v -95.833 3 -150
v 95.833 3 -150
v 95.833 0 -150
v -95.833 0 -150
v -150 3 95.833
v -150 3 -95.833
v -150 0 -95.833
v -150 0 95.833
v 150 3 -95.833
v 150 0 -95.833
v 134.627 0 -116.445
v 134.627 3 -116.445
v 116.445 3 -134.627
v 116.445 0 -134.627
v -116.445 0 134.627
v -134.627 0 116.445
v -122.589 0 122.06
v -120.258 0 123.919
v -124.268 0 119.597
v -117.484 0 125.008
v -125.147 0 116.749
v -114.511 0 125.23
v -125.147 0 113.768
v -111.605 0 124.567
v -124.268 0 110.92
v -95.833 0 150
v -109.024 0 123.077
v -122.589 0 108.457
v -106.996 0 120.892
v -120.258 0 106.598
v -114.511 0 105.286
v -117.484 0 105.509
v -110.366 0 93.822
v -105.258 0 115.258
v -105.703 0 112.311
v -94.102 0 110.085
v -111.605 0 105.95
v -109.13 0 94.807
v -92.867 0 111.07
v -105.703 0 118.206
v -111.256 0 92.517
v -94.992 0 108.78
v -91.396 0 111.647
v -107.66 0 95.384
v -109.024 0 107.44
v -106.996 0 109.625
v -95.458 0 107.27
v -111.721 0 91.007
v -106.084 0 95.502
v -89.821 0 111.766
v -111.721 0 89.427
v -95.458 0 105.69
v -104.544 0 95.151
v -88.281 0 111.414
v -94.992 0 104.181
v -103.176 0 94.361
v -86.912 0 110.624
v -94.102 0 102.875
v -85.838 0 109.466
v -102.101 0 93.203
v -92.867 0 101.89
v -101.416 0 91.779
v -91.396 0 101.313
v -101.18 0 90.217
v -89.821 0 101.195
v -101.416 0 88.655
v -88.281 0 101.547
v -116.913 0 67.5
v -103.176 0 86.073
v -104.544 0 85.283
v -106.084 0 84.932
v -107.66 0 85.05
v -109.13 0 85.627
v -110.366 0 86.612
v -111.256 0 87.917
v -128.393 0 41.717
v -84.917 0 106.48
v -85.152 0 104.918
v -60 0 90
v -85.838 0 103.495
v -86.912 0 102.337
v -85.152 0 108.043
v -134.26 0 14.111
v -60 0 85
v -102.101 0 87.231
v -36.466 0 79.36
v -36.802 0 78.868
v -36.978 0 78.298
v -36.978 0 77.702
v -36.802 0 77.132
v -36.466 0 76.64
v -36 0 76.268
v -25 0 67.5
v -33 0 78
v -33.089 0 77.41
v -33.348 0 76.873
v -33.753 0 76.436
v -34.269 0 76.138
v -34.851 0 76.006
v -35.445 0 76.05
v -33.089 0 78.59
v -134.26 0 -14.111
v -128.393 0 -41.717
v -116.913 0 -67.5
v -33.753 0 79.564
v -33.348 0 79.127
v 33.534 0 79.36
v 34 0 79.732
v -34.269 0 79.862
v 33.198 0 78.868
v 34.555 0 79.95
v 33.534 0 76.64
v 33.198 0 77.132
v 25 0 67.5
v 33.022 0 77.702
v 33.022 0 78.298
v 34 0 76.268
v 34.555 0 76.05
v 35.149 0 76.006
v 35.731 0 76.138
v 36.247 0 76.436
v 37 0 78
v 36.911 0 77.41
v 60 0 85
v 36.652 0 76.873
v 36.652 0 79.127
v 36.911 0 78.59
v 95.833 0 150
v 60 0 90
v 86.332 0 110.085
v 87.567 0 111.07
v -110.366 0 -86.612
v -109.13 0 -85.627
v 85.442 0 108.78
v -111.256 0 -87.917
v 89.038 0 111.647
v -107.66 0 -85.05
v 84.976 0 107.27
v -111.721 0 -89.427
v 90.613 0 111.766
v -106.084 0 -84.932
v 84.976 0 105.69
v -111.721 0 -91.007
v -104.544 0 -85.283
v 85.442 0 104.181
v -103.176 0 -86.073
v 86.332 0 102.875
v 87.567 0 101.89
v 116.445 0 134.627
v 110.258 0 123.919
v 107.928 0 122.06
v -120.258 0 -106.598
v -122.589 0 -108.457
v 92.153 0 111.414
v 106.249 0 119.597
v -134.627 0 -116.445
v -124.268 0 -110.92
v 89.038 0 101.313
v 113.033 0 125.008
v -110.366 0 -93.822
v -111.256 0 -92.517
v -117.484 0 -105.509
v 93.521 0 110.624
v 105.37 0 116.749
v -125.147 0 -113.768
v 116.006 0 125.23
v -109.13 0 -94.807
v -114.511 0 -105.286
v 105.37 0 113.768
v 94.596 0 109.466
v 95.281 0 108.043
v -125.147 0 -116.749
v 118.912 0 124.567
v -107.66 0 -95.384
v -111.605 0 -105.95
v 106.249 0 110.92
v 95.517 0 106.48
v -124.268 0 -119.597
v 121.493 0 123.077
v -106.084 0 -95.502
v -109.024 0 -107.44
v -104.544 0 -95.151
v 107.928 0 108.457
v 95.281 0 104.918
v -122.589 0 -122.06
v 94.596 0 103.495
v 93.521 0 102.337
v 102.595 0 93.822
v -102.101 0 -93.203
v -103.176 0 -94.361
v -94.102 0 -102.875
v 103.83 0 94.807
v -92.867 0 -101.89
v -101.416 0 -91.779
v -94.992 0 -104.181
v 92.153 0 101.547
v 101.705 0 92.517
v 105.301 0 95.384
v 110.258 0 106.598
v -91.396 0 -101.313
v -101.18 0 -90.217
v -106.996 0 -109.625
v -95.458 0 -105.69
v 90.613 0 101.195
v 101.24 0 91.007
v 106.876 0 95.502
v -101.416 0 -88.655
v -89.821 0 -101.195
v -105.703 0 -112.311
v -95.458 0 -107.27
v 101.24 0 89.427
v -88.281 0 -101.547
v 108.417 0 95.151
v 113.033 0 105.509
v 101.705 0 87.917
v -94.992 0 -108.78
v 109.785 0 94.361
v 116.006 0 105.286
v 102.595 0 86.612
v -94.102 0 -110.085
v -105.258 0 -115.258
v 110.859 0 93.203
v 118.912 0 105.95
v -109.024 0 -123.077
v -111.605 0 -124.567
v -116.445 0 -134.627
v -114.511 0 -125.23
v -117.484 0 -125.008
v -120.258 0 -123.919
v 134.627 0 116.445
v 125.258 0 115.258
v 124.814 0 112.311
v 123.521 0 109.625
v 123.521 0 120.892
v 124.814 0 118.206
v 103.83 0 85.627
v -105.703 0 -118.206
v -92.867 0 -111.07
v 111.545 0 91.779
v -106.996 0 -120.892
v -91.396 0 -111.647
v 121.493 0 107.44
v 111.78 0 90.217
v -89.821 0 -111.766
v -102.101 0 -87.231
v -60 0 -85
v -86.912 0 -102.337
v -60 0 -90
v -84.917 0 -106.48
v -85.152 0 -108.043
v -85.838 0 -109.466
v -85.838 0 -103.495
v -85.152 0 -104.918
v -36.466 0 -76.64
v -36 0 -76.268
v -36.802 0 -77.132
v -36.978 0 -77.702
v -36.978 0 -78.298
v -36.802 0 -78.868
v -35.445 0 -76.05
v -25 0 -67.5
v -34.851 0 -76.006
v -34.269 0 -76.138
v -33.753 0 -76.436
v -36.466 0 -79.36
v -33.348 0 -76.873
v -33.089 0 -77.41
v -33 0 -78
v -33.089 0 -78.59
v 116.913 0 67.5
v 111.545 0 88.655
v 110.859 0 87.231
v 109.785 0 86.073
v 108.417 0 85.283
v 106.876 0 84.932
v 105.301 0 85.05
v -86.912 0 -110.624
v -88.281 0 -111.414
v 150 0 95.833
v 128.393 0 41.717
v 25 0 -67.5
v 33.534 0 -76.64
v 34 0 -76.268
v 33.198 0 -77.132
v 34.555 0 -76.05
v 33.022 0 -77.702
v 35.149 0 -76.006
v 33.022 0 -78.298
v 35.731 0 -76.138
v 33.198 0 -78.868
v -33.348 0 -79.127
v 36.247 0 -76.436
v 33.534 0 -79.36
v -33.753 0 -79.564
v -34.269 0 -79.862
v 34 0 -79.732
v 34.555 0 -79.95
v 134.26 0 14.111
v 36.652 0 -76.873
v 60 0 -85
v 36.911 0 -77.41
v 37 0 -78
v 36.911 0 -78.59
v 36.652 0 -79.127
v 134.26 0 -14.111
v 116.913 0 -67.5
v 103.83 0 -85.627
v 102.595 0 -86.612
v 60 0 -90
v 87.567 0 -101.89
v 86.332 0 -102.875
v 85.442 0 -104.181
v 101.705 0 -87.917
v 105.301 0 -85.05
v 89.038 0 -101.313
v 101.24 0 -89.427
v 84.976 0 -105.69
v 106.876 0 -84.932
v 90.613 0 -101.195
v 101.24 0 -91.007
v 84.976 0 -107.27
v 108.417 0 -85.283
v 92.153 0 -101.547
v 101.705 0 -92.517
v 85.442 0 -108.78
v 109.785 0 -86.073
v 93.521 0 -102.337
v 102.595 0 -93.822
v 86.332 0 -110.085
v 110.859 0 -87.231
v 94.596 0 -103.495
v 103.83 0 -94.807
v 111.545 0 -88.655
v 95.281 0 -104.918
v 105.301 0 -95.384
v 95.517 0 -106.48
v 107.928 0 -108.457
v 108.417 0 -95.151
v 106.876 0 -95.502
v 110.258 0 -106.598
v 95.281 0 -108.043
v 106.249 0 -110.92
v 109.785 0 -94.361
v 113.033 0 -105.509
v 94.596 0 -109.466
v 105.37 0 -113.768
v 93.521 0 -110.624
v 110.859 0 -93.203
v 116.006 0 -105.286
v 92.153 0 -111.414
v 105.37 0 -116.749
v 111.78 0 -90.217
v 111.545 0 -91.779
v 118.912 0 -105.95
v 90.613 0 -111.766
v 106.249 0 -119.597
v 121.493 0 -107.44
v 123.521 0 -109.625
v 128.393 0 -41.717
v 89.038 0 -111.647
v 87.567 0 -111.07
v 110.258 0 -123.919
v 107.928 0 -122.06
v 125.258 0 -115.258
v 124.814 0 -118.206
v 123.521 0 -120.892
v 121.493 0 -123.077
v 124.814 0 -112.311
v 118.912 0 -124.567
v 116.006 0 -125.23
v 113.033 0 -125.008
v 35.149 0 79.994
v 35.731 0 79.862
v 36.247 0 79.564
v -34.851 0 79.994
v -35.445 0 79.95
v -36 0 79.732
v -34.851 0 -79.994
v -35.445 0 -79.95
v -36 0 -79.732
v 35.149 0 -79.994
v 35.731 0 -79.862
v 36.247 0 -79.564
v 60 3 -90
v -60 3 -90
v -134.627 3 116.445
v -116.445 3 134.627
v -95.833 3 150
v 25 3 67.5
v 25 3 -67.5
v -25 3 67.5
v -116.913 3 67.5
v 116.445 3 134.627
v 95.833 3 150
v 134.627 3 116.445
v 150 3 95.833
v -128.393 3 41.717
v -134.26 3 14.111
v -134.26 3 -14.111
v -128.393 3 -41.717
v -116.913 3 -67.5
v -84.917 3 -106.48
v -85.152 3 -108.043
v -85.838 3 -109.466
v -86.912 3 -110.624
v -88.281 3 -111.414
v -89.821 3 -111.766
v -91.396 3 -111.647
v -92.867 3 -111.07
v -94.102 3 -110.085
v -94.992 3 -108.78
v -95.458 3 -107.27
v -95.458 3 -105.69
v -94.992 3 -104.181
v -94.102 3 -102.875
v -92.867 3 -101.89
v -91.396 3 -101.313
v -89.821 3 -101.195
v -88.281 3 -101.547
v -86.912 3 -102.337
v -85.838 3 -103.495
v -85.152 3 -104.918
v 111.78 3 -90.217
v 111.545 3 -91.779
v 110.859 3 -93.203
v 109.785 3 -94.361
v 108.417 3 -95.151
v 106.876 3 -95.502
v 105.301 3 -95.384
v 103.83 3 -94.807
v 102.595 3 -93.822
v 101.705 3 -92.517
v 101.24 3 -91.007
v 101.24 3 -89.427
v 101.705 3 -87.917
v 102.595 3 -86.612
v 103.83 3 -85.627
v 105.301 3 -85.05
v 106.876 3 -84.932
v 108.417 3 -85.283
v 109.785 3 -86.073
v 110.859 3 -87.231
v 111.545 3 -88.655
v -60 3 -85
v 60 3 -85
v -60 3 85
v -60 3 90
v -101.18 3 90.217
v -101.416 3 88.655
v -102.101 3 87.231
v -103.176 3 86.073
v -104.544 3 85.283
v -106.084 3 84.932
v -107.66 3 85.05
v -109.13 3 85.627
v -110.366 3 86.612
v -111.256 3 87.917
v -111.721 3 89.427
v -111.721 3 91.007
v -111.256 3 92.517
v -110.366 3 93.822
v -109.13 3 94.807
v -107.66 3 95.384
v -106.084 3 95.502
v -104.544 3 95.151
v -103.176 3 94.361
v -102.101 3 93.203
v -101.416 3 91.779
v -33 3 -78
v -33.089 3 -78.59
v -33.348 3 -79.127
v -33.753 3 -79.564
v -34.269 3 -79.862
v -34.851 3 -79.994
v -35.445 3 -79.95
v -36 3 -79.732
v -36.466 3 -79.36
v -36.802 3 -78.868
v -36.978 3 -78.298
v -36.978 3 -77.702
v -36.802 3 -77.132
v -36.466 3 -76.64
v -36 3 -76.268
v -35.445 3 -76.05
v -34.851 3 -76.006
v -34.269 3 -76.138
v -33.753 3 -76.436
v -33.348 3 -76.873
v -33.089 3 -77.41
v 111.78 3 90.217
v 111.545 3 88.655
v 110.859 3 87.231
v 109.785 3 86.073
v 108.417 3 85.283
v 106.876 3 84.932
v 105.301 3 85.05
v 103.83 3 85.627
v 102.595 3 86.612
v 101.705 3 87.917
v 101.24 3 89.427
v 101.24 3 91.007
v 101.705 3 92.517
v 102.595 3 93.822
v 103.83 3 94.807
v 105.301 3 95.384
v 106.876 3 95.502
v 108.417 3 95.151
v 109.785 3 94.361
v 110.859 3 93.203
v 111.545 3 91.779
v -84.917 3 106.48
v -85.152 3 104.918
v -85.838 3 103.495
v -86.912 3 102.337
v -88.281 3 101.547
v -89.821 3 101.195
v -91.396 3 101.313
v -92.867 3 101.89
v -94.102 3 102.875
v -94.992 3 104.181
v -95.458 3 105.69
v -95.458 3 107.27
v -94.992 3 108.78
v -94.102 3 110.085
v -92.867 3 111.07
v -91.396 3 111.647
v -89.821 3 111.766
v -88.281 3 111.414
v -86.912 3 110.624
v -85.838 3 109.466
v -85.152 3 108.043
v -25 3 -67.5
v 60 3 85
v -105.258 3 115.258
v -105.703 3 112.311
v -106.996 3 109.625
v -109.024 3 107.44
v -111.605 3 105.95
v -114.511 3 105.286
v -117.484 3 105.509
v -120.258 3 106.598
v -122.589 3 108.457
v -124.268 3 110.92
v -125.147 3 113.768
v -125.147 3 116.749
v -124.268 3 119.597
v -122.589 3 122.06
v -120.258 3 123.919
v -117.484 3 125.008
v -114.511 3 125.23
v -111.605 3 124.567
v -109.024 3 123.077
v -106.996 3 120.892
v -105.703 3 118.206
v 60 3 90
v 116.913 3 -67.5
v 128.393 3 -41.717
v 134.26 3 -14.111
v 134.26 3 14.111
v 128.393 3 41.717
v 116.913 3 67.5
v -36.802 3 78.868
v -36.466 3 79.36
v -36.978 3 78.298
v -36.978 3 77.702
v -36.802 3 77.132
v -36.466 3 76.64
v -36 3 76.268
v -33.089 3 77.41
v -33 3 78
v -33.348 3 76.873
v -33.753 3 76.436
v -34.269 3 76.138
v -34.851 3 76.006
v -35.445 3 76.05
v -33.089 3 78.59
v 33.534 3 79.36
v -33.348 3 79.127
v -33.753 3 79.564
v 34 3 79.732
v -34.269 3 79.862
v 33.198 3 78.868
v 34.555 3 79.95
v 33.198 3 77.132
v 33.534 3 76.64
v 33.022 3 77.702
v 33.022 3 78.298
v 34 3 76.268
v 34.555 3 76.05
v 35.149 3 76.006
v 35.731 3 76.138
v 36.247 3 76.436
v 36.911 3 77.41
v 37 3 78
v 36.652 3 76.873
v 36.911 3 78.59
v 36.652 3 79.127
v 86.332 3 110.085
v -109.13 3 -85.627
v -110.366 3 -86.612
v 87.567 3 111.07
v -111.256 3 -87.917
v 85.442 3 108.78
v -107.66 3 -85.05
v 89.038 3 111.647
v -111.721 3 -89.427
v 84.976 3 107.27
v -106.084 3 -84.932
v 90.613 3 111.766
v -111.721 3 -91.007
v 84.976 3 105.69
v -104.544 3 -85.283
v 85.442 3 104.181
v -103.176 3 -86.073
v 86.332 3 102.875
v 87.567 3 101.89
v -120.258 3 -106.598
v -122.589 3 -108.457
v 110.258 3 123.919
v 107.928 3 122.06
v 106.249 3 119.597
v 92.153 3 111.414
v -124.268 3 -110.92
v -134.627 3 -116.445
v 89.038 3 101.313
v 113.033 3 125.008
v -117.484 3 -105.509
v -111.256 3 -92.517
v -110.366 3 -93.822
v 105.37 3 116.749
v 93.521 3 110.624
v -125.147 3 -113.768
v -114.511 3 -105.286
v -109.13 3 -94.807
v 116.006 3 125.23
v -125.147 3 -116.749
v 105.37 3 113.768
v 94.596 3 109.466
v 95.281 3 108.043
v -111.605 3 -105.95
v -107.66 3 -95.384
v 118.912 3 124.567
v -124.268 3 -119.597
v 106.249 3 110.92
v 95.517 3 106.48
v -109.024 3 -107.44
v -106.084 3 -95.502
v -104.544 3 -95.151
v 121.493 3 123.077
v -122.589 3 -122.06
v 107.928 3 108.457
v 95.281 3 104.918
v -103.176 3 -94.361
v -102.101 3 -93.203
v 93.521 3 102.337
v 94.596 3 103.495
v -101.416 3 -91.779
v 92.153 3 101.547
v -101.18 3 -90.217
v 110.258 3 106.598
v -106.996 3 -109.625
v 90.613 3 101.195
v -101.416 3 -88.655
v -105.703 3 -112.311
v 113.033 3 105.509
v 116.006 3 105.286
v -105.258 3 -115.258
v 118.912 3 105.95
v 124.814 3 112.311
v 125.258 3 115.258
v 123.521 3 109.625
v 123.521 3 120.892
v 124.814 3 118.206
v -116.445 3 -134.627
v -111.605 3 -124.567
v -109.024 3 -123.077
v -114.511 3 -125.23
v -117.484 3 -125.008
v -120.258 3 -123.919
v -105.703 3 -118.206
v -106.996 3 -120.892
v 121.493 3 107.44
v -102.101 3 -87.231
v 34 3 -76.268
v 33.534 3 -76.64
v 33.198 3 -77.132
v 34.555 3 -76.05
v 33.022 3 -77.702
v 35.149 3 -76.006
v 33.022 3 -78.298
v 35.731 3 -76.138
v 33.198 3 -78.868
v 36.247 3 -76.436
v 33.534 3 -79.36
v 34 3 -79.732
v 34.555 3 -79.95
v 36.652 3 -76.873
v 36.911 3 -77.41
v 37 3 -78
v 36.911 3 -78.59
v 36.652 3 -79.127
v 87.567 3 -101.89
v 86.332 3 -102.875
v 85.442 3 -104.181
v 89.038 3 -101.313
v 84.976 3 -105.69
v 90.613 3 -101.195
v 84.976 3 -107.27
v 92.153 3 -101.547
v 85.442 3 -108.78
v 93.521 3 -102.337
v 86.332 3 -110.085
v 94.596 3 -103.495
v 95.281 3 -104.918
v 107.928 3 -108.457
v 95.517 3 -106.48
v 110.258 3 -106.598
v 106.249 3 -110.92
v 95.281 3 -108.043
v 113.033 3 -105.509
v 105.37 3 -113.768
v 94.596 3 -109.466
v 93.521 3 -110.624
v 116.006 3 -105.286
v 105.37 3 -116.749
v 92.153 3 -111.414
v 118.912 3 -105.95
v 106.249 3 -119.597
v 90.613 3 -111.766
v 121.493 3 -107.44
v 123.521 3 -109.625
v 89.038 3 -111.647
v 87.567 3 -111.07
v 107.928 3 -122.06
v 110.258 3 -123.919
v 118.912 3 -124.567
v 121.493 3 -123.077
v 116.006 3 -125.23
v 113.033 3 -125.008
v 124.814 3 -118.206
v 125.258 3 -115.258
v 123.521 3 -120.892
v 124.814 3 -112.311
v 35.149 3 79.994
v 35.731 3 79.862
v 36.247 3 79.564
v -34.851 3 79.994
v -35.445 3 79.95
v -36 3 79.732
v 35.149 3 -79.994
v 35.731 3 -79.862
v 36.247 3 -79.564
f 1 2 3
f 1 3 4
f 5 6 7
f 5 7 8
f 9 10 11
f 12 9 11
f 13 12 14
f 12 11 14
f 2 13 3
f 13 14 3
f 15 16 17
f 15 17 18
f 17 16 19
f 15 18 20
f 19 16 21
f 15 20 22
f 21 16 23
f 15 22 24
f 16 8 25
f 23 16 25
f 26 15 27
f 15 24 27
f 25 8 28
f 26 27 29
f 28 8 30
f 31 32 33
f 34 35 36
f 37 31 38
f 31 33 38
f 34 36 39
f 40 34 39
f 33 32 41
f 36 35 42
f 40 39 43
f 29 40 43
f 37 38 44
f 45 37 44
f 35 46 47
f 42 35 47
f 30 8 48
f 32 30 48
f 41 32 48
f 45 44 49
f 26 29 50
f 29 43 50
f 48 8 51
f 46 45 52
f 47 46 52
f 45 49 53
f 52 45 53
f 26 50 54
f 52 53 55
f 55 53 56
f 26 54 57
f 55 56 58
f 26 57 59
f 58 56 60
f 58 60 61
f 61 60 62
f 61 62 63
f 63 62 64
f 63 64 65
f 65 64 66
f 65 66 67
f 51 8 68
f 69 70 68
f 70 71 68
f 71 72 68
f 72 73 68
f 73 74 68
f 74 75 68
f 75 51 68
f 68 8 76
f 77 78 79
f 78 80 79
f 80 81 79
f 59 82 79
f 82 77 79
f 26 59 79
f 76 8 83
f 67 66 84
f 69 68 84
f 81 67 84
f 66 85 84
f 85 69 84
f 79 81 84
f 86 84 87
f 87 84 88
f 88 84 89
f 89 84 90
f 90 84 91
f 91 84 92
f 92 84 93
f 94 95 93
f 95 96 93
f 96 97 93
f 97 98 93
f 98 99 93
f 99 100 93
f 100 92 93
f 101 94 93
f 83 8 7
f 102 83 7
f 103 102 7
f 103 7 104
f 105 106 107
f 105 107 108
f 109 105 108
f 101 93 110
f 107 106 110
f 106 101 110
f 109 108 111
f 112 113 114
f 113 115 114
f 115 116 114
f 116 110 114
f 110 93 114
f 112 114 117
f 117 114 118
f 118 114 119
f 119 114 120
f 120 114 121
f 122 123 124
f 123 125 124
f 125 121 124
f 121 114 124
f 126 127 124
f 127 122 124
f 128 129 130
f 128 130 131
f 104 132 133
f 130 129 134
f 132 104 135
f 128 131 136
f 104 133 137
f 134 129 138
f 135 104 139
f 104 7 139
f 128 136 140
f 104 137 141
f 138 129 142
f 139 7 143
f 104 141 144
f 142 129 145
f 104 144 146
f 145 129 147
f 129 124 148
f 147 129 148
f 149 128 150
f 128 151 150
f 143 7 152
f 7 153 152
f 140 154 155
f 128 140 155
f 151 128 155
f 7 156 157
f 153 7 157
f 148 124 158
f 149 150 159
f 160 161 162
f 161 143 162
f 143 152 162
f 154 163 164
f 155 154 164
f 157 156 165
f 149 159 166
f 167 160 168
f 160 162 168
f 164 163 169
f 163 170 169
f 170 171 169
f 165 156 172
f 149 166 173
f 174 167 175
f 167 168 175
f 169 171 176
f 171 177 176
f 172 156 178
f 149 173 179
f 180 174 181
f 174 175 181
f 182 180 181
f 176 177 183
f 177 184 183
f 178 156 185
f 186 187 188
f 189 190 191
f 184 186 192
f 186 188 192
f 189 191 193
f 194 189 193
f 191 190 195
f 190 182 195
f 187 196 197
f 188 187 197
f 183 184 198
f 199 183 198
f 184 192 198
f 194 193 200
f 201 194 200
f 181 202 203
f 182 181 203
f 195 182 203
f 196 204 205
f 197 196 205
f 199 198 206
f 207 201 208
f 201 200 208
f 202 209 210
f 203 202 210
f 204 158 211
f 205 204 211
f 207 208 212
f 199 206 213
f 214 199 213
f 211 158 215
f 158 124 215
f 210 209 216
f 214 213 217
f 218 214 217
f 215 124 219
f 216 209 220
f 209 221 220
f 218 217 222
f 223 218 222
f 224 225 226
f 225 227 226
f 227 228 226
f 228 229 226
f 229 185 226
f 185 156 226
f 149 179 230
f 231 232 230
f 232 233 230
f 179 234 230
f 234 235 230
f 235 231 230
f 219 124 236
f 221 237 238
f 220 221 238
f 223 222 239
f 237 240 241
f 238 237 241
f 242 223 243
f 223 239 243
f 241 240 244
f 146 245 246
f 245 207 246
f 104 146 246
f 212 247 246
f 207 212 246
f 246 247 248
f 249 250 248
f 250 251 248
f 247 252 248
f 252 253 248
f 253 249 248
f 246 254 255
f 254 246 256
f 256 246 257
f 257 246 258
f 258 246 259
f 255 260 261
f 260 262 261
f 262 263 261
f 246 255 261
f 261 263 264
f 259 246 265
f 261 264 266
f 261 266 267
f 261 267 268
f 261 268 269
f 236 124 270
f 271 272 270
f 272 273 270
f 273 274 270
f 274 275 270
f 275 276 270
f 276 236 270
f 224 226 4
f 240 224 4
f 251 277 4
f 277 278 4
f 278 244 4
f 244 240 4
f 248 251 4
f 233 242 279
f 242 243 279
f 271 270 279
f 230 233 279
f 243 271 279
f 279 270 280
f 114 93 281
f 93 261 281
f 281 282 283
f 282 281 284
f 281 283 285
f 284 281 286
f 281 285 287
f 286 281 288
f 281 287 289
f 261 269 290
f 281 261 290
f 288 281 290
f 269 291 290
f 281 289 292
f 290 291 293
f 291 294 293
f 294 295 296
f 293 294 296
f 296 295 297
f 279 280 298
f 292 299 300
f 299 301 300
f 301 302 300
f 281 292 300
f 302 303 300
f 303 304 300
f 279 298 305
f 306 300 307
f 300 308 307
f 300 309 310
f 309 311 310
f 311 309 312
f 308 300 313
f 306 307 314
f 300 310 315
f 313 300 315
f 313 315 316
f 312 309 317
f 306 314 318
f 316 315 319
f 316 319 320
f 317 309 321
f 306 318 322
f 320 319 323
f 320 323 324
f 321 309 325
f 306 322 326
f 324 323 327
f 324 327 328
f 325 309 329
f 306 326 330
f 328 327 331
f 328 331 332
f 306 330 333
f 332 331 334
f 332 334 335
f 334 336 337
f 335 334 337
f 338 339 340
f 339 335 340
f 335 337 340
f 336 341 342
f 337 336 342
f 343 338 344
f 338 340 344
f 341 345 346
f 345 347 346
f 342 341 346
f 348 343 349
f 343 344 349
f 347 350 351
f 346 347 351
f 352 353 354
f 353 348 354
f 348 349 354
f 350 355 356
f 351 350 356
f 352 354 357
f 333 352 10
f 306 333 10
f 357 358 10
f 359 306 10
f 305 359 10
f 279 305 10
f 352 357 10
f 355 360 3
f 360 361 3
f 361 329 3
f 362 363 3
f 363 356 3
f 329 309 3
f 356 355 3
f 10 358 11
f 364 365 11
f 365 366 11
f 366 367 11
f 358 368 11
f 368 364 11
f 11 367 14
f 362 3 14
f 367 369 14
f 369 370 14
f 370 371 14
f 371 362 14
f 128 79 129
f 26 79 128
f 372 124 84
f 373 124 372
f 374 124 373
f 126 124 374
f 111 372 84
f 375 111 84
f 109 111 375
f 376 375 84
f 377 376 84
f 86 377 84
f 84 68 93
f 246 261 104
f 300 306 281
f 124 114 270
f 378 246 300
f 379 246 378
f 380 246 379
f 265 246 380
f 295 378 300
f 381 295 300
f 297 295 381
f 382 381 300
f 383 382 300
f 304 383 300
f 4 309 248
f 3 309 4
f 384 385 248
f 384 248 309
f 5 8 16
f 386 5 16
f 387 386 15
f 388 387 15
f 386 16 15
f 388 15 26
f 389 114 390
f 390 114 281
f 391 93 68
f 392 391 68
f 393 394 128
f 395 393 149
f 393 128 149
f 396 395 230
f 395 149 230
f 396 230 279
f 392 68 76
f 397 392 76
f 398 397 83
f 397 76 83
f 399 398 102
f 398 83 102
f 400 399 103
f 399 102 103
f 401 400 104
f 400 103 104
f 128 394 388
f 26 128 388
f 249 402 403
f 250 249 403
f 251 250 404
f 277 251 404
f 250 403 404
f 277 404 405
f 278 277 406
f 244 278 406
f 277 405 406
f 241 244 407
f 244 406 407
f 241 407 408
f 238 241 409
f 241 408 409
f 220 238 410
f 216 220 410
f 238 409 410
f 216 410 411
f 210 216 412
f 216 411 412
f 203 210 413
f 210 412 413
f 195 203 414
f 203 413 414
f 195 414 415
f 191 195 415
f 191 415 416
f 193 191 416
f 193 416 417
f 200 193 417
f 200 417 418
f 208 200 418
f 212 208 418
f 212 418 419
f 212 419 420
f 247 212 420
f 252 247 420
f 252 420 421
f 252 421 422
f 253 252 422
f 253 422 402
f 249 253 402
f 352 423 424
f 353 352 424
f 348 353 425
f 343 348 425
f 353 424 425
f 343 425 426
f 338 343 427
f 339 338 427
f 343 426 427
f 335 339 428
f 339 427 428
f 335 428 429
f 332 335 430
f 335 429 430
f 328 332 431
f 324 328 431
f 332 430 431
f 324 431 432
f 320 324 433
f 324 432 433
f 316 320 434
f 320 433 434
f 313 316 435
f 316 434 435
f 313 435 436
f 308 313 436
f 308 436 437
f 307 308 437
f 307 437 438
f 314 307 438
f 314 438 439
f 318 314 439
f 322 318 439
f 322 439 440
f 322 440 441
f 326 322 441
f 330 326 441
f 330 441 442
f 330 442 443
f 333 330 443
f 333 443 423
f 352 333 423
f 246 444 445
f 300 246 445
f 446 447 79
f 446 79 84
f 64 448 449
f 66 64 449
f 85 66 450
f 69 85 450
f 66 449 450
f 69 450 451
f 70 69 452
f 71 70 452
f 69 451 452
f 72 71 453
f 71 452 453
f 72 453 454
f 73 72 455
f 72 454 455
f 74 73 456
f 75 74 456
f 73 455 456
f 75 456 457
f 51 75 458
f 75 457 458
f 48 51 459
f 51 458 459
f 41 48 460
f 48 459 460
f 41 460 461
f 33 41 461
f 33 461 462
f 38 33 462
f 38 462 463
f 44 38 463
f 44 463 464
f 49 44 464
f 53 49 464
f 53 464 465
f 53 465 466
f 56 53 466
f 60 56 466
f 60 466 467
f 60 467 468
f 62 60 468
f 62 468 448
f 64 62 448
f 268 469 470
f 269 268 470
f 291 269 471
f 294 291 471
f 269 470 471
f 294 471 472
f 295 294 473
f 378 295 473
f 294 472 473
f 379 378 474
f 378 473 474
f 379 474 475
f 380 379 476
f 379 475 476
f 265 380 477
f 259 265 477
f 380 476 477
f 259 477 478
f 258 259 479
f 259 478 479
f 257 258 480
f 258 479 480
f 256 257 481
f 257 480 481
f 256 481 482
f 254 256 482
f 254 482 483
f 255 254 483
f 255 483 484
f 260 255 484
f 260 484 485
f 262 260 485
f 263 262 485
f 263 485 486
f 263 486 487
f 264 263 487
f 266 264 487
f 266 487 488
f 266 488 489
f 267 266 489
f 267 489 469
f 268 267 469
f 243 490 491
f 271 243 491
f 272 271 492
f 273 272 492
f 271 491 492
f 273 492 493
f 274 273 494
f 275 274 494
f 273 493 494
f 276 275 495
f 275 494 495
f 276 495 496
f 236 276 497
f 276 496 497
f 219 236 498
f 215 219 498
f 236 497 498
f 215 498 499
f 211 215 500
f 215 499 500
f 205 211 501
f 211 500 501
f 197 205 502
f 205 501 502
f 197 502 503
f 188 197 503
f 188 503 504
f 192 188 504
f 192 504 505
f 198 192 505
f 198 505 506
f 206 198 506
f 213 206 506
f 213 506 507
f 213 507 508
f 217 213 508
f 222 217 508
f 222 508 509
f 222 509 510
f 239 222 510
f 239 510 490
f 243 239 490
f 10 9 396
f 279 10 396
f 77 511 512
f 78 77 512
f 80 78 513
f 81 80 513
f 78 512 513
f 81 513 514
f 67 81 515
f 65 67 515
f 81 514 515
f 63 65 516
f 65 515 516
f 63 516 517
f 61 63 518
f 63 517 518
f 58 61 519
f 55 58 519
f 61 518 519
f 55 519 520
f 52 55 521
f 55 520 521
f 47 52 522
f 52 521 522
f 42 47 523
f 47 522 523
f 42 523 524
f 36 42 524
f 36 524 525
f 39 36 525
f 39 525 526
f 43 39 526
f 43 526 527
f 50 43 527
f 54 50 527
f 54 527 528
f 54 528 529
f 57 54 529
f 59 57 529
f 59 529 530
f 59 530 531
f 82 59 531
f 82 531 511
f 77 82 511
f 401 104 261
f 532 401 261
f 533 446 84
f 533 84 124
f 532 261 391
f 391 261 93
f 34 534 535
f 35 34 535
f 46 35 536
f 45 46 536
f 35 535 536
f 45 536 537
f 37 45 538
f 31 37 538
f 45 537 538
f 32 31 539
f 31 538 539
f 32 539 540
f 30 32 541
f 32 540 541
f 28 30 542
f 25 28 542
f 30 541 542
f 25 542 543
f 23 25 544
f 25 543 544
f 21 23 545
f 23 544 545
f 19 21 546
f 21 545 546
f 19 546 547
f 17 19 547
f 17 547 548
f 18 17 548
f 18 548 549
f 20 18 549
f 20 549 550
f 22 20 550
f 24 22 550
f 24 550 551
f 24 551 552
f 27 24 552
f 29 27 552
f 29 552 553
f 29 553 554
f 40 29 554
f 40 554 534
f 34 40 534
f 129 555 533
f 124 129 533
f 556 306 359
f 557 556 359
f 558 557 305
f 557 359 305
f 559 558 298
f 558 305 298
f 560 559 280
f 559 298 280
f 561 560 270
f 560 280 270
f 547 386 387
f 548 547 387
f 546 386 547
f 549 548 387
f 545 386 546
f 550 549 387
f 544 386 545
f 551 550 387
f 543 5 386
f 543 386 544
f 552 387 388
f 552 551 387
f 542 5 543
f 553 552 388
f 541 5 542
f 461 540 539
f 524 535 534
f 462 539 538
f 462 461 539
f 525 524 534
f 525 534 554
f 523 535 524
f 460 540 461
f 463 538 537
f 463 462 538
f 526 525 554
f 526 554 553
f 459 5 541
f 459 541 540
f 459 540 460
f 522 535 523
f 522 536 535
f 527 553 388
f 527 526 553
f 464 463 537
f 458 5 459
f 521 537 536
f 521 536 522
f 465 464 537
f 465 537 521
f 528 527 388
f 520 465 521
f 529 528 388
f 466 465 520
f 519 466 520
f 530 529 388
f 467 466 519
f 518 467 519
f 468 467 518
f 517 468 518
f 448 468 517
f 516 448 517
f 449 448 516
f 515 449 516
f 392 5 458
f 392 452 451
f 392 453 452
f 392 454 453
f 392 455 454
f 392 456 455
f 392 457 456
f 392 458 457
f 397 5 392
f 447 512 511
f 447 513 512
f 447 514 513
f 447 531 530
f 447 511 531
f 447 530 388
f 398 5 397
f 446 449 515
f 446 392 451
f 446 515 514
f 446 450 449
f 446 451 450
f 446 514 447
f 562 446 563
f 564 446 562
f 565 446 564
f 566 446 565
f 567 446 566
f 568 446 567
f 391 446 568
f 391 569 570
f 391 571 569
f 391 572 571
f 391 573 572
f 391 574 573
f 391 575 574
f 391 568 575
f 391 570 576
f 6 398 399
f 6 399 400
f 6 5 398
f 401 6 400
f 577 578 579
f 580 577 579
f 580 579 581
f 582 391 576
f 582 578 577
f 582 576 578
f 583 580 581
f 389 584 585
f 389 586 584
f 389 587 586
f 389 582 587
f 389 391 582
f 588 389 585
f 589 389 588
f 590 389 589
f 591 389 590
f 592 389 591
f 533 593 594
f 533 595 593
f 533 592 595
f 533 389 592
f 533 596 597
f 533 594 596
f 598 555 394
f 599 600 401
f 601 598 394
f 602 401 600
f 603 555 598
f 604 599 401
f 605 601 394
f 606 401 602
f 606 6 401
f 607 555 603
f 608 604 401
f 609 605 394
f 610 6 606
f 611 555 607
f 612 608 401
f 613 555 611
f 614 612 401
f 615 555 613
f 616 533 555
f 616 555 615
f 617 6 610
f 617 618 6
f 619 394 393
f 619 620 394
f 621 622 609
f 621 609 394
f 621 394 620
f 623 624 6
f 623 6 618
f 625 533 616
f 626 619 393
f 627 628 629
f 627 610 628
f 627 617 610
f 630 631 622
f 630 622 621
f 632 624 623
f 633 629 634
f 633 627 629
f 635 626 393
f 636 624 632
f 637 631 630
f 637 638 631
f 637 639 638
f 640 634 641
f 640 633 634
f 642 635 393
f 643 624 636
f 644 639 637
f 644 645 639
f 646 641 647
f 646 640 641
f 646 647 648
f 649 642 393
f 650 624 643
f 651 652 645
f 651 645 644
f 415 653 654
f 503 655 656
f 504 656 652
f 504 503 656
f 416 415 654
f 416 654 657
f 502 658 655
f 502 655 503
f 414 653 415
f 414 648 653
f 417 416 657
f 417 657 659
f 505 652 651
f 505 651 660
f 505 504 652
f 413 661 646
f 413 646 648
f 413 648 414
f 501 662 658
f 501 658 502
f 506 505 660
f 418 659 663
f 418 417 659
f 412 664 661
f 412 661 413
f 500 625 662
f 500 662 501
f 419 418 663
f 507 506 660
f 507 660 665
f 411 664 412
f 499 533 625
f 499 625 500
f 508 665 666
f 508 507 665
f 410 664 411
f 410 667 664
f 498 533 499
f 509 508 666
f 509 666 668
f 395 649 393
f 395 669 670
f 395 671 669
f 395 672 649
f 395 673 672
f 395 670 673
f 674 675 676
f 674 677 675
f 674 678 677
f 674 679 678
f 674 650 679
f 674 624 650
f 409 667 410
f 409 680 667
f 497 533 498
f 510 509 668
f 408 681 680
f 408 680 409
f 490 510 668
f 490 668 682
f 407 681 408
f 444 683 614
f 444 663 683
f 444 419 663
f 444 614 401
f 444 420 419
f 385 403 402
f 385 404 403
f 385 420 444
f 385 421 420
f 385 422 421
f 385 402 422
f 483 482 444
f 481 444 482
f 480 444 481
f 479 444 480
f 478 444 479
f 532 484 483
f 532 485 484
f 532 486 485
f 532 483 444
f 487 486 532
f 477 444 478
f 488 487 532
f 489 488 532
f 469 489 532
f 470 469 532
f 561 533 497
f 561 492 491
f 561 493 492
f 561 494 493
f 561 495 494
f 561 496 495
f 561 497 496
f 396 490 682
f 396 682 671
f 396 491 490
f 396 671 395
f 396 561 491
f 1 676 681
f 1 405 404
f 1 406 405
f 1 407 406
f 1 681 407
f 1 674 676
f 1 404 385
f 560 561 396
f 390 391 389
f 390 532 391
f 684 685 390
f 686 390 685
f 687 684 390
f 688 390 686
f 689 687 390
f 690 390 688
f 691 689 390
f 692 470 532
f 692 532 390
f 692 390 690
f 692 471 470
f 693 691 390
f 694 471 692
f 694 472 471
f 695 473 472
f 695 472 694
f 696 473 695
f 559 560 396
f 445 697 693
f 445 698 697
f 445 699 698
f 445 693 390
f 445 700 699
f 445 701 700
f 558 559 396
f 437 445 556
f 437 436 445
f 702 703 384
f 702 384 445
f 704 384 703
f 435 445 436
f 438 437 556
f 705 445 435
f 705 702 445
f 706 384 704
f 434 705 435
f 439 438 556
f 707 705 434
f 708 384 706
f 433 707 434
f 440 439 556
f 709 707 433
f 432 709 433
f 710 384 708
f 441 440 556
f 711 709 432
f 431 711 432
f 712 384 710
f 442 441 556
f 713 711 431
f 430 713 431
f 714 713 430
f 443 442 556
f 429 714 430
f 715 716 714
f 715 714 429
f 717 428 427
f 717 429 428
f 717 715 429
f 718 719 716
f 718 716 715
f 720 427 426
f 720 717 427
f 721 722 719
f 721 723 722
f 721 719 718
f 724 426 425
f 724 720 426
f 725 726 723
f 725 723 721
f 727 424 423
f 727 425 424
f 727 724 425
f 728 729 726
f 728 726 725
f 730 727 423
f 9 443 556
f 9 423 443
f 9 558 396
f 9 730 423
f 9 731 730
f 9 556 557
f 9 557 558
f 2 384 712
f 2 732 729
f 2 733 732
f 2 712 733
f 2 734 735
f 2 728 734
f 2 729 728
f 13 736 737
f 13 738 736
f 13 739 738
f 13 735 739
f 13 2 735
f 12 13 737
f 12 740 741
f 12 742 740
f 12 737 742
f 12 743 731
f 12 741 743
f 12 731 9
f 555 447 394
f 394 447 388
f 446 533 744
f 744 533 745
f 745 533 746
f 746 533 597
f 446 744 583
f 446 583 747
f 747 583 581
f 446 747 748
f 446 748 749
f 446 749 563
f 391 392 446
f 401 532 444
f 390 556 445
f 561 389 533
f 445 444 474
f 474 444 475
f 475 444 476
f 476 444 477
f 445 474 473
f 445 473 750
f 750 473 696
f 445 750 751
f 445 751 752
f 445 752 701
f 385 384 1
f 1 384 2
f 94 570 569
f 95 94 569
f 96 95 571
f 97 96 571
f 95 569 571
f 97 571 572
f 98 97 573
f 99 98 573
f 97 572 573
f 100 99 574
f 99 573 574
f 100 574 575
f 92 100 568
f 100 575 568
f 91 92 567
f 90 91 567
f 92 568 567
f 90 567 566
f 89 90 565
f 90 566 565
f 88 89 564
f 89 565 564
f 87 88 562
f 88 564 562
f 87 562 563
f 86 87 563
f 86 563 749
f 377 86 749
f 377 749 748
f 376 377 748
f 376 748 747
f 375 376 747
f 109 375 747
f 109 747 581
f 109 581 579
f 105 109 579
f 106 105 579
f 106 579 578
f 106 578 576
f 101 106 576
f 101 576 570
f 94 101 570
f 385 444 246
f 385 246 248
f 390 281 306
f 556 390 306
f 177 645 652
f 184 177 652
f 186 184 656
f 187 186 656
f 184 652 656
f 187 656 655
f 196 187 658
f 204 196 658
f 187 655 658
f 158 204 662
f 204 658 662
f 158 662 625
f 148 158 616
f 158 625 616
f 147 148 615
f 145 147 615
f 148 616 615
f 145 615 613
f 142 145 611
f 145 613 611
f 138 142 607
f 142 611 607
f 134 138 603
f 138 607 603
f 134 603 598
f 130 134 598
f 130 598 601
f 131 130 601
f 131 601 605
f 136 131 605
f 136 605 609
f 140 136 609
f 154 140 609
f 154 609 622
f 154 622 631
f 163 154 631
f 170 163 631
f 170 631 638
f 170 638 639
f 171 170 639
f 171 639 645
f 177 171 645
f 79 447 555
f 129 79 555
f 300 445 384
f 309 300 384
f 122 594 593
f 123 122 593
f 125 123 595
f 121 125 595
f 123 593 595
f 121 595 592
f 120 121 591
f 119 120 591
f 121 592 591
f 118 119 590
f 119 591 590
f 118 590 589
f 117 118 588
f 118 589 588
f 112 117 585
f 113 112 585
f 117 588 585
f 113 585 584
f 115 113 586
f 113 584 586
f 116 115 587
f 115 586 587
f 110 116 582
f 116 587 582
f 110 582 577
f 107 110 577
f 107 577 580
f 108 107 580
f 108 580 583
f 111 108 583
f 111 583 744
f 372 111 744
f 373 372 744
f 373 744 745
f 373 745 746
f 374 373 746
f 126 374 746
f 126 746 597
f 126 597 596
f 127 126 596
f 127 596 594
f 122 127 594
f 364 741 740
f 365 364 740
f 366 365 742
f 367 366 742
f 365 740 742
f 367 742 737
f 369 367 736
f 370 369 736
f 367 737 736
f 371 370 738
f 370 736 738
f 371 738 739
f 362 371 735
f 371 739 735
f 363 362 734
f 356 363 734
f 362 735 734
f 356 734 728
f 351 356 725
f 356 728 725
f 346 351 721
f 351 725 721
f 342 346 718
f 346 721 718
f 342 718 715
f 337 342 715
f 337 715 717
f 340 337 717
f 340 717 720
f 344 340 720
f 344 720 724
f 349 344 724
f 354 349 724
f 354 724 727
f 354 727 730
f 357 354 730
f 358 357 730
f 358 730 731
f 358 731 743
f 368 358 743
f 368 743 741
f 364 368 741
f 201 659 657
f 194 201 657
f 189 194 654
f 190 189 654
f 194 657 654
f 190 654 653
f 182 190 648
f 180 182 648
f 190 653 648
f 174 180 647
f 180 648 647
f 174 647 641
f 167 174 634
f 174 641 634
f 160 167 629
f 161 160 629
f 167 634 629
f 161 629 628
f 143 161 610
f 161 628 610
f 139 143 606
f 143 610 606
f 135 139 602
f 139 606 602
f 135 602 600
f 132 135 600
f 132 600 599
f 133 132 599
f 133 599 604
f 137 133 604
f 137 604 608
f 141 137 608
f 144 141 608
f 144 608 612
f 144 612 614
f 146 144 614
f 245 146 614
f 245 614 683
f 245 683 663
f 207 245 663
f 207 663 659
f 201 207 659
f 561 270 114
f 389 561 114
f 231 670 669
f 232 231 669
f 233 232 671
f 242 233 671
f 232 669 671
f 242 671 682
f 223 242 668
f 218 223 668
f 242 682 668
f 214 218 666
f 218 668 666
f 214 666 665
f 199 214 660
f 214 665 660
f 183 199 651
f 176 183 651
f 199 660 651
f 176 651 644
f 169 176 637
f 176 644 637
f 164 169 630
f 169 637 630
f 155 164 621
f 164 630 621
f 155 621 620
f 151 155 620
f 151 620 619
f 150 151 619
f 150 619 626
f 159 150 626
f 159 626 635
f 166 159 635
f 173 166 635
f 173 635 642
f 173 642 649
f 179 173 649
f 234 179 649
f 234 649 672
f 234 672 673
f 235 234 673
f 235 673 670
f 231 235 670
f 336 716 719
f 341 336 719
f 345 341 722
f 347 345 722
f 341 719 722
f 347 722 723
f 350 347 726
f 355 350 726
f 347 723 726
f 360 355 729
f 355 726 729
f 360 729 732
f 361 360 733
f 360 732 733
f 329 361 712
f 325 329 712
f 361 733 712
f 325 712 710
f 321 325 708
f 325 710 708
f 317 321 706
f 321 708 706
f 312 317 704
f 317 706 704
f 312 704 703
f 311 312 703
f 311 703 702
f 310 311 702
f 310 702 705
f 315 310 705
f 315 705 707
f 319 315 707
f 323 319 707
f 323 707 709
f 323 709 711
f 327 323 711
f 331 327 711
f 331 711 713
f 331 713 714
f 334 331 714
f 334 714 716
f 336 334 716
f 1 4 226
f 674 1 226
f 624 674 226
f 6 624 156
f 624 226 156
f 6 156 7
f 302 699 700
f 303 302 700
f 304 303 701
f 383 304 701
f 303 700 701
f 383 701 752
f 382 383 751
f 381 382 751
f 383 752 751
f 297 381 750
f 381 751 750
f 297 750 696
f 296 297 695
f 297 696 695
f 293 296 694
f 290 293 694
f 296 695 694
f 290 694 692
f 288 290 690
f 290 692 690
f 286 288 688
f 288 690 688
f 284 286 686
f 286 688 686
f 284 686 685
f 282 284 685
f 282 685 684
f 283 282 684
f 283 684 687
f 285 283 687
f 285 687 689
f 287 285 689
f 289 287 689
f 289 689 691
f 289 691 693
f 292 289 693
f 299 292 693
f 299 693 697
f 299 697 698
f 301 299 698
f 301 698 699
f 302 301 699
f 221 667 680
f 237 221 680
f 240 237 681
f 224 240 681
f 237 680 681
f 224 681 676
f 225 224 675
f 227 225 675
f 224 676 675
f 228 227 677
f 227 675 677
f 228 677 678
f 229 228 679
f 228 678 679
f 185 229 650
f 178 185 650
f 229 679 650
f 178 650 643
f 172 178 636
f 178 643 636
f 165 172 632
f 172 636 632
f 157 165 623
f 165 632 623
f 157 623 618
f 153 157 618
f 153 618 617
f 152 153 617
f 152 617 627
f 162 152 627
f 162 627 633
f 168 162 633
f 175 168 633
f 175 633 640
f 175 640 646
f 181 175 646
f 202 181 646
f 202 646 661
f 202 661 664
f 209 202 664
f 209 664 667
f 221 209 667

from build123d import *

# Parameters (mm, degrees)
SKETCH_3_R          = 178
EXTRUDE_3_DEPTH     = 3
SKETCH_4_R          = 10
SKETCH_4_R_2        = 5.3
CUT_EXTRUDE_1_DEPTH = 10
CUT_EXTRUDE_2_DEPTH = 10
SKETCH_6_R          = 2
SKETCH_6_W          = 120
SKETCH_6_H          = 5
CUT_EXTRUDE_3_DEPTH = 10


with BuildPart() as part:
    # 草图3 → 凸台-拉伸3 (new body)
    with BuildSketch(Plane(origin=(0, 0, 0), x_dir=(1, 0, 0), z_dir=(0, 1, 0))):
        Circle(SKETCH_3_R)
        with BuildLine():
            Line((-25, 33.75), (-25, -67.5))
            Line((-25, -67.5), (-116.913429511, -67.5))
            ThreePointArc((-116.913429511, -67.5), (-135, 0), (-116.913429511, 67.5))
            Line((-116.913429511, 67.5), (-25, 67.5))
            Line((-25, 67.5), (-25, 33.75))
        make_face(mode=Mode.SUBTRACT)
        with BuildLine():
            Line((25, 33.75), (25, 67.5))
            Line((25, 67.5), (116.913429511, 67.5))
            ThreePointArc((116.913429511, 67.5), (135, 0), (116.913429511, -67.5))
            Line((116.913429511, -67.5), (25, -67.5))
            Line((25, -67.5), (25, 33.75))
        make_face(mode=Mode.SUBTRACT)
    extrude(amount=EXTRUDE_3_DEPTH)

    # 草图4 → 切除-拉伸1 (cut)
    with BuildSketch(Plane(origin=(0, 3, 0), x_dir=(1, 0, 0), z_dir=(0, 1, 0))):
        with Locations((115.258405333, 115.258405333)):
            Circle(SKETCH_4_R)
        with Locations((115.258405333, -115.258405333)):
            Circle(SKETCH_4_R)
        with Locations((-115.258405333, -115.258405333)):
            Circle(SKETCH_4_R)
        with Locations((-115.258405333, 115.258405333)):
            Circle(SKETCH_4_R)
        with Locations((-90.216925784, -106.480381752)):
            Circle(SKETCH_4_R_2)
        with Locations((-106.480381752, -90.216925784)):
            Circle(SKETCH_4_R_2)
        with Locations((-106.480381752, 90.216925784)):
            Circle(SKETCH_4_R_2)
        with Locations((-90.216925784, 106.480381752)):
            Circle(SKETCH_4_R_2)
        with Locations((90.216925784, 106.480381752)):
            Circle(SKETCH_4_R_2)
        with Locations((106.480381752, 90.216925784)):
            Circle(SKETCH_4_R_2)
        with Locations((106.480381752, -90.216925784)):
            Circle(SKETCH_4_R_2)
        with Locations((90.216925784, -106.480381752)):
            Circle(SKETCH_4_R_2)
    extrude(amount=-CUT_EXTRUDE_1_DEPTH, mode=Mode.SUBTRACT)

    # 草图5 → 切除-拉伸2 (cut)
    with BuildSketch(Plane(origin=(0, 3, 0), x_dir=(1, 0, 0), z_dir=(0, 1, 0))):
        with BuildLine():
            Line((95.833188406, 150), (0, 150))
            Line((0, 150), (-95.833188406, 150))
            ThreePointArc((-95.833188406, 150), (0, 178), (95.833188406, 150))
        make_face()
        with BuildLine():
            Line((150, 95.833188406), (150, 0))
            Line((150, 0), (150, -95.833188406))
            ThreePointArc((150, -95.833188406), (178, 0), (150, 95.833188406))
        make_face()
        with BuildLine():
            Line((95.833188406, -150), (0, -150))
            Line((0, -150), (-95.833188406, -150))
            ThreePointArc((-95.833188406, -150), (0, -178), (95.833188406, -150))
        make_face()
        with BuildLine():
            Line((-150, 0), (-150, -95.833188406))
            ThreePointArc((-150, -95.833188406), (-178, 0), (-150, 95.833188406))
            Line((-150, 95.833188406), (-150, 0))
        make_face()
    extrude(amount=-CUT_EXTRUDE_2_DEPTH, mode=Mode.SUBTRACT)

    # 草图6 → 切除-拉伸3 (cut)
    with BuildSketch(Plane(origin=(0, 3, 0), x_dir=(1, 0, 0), z_dir=(0, 1, 0))):
        with Locations((35, -78)):
            Circle(SKETCH_6_R)
        with Locations((-35, -78)):
            Circle(SKETCH_6_R)
        with Locations((-35, 78)):
            Circle(SKETCH_6_R)
        with Locations((35, 78)):
            Circle(SKETCH_6_R)
        with Locations((0, -87.5)):
            Rectangle(SKETCH_6_W, SKETCH_6_H)
        with Locations((0, 87.5)):
            Rectangle(SKETCH_6_W, SKETCH_6_H)
    extrude(amount=-CUT_EXTRUDE_3_DEPTH, mode=Mode.SUBTRACT)


solid = part.part
